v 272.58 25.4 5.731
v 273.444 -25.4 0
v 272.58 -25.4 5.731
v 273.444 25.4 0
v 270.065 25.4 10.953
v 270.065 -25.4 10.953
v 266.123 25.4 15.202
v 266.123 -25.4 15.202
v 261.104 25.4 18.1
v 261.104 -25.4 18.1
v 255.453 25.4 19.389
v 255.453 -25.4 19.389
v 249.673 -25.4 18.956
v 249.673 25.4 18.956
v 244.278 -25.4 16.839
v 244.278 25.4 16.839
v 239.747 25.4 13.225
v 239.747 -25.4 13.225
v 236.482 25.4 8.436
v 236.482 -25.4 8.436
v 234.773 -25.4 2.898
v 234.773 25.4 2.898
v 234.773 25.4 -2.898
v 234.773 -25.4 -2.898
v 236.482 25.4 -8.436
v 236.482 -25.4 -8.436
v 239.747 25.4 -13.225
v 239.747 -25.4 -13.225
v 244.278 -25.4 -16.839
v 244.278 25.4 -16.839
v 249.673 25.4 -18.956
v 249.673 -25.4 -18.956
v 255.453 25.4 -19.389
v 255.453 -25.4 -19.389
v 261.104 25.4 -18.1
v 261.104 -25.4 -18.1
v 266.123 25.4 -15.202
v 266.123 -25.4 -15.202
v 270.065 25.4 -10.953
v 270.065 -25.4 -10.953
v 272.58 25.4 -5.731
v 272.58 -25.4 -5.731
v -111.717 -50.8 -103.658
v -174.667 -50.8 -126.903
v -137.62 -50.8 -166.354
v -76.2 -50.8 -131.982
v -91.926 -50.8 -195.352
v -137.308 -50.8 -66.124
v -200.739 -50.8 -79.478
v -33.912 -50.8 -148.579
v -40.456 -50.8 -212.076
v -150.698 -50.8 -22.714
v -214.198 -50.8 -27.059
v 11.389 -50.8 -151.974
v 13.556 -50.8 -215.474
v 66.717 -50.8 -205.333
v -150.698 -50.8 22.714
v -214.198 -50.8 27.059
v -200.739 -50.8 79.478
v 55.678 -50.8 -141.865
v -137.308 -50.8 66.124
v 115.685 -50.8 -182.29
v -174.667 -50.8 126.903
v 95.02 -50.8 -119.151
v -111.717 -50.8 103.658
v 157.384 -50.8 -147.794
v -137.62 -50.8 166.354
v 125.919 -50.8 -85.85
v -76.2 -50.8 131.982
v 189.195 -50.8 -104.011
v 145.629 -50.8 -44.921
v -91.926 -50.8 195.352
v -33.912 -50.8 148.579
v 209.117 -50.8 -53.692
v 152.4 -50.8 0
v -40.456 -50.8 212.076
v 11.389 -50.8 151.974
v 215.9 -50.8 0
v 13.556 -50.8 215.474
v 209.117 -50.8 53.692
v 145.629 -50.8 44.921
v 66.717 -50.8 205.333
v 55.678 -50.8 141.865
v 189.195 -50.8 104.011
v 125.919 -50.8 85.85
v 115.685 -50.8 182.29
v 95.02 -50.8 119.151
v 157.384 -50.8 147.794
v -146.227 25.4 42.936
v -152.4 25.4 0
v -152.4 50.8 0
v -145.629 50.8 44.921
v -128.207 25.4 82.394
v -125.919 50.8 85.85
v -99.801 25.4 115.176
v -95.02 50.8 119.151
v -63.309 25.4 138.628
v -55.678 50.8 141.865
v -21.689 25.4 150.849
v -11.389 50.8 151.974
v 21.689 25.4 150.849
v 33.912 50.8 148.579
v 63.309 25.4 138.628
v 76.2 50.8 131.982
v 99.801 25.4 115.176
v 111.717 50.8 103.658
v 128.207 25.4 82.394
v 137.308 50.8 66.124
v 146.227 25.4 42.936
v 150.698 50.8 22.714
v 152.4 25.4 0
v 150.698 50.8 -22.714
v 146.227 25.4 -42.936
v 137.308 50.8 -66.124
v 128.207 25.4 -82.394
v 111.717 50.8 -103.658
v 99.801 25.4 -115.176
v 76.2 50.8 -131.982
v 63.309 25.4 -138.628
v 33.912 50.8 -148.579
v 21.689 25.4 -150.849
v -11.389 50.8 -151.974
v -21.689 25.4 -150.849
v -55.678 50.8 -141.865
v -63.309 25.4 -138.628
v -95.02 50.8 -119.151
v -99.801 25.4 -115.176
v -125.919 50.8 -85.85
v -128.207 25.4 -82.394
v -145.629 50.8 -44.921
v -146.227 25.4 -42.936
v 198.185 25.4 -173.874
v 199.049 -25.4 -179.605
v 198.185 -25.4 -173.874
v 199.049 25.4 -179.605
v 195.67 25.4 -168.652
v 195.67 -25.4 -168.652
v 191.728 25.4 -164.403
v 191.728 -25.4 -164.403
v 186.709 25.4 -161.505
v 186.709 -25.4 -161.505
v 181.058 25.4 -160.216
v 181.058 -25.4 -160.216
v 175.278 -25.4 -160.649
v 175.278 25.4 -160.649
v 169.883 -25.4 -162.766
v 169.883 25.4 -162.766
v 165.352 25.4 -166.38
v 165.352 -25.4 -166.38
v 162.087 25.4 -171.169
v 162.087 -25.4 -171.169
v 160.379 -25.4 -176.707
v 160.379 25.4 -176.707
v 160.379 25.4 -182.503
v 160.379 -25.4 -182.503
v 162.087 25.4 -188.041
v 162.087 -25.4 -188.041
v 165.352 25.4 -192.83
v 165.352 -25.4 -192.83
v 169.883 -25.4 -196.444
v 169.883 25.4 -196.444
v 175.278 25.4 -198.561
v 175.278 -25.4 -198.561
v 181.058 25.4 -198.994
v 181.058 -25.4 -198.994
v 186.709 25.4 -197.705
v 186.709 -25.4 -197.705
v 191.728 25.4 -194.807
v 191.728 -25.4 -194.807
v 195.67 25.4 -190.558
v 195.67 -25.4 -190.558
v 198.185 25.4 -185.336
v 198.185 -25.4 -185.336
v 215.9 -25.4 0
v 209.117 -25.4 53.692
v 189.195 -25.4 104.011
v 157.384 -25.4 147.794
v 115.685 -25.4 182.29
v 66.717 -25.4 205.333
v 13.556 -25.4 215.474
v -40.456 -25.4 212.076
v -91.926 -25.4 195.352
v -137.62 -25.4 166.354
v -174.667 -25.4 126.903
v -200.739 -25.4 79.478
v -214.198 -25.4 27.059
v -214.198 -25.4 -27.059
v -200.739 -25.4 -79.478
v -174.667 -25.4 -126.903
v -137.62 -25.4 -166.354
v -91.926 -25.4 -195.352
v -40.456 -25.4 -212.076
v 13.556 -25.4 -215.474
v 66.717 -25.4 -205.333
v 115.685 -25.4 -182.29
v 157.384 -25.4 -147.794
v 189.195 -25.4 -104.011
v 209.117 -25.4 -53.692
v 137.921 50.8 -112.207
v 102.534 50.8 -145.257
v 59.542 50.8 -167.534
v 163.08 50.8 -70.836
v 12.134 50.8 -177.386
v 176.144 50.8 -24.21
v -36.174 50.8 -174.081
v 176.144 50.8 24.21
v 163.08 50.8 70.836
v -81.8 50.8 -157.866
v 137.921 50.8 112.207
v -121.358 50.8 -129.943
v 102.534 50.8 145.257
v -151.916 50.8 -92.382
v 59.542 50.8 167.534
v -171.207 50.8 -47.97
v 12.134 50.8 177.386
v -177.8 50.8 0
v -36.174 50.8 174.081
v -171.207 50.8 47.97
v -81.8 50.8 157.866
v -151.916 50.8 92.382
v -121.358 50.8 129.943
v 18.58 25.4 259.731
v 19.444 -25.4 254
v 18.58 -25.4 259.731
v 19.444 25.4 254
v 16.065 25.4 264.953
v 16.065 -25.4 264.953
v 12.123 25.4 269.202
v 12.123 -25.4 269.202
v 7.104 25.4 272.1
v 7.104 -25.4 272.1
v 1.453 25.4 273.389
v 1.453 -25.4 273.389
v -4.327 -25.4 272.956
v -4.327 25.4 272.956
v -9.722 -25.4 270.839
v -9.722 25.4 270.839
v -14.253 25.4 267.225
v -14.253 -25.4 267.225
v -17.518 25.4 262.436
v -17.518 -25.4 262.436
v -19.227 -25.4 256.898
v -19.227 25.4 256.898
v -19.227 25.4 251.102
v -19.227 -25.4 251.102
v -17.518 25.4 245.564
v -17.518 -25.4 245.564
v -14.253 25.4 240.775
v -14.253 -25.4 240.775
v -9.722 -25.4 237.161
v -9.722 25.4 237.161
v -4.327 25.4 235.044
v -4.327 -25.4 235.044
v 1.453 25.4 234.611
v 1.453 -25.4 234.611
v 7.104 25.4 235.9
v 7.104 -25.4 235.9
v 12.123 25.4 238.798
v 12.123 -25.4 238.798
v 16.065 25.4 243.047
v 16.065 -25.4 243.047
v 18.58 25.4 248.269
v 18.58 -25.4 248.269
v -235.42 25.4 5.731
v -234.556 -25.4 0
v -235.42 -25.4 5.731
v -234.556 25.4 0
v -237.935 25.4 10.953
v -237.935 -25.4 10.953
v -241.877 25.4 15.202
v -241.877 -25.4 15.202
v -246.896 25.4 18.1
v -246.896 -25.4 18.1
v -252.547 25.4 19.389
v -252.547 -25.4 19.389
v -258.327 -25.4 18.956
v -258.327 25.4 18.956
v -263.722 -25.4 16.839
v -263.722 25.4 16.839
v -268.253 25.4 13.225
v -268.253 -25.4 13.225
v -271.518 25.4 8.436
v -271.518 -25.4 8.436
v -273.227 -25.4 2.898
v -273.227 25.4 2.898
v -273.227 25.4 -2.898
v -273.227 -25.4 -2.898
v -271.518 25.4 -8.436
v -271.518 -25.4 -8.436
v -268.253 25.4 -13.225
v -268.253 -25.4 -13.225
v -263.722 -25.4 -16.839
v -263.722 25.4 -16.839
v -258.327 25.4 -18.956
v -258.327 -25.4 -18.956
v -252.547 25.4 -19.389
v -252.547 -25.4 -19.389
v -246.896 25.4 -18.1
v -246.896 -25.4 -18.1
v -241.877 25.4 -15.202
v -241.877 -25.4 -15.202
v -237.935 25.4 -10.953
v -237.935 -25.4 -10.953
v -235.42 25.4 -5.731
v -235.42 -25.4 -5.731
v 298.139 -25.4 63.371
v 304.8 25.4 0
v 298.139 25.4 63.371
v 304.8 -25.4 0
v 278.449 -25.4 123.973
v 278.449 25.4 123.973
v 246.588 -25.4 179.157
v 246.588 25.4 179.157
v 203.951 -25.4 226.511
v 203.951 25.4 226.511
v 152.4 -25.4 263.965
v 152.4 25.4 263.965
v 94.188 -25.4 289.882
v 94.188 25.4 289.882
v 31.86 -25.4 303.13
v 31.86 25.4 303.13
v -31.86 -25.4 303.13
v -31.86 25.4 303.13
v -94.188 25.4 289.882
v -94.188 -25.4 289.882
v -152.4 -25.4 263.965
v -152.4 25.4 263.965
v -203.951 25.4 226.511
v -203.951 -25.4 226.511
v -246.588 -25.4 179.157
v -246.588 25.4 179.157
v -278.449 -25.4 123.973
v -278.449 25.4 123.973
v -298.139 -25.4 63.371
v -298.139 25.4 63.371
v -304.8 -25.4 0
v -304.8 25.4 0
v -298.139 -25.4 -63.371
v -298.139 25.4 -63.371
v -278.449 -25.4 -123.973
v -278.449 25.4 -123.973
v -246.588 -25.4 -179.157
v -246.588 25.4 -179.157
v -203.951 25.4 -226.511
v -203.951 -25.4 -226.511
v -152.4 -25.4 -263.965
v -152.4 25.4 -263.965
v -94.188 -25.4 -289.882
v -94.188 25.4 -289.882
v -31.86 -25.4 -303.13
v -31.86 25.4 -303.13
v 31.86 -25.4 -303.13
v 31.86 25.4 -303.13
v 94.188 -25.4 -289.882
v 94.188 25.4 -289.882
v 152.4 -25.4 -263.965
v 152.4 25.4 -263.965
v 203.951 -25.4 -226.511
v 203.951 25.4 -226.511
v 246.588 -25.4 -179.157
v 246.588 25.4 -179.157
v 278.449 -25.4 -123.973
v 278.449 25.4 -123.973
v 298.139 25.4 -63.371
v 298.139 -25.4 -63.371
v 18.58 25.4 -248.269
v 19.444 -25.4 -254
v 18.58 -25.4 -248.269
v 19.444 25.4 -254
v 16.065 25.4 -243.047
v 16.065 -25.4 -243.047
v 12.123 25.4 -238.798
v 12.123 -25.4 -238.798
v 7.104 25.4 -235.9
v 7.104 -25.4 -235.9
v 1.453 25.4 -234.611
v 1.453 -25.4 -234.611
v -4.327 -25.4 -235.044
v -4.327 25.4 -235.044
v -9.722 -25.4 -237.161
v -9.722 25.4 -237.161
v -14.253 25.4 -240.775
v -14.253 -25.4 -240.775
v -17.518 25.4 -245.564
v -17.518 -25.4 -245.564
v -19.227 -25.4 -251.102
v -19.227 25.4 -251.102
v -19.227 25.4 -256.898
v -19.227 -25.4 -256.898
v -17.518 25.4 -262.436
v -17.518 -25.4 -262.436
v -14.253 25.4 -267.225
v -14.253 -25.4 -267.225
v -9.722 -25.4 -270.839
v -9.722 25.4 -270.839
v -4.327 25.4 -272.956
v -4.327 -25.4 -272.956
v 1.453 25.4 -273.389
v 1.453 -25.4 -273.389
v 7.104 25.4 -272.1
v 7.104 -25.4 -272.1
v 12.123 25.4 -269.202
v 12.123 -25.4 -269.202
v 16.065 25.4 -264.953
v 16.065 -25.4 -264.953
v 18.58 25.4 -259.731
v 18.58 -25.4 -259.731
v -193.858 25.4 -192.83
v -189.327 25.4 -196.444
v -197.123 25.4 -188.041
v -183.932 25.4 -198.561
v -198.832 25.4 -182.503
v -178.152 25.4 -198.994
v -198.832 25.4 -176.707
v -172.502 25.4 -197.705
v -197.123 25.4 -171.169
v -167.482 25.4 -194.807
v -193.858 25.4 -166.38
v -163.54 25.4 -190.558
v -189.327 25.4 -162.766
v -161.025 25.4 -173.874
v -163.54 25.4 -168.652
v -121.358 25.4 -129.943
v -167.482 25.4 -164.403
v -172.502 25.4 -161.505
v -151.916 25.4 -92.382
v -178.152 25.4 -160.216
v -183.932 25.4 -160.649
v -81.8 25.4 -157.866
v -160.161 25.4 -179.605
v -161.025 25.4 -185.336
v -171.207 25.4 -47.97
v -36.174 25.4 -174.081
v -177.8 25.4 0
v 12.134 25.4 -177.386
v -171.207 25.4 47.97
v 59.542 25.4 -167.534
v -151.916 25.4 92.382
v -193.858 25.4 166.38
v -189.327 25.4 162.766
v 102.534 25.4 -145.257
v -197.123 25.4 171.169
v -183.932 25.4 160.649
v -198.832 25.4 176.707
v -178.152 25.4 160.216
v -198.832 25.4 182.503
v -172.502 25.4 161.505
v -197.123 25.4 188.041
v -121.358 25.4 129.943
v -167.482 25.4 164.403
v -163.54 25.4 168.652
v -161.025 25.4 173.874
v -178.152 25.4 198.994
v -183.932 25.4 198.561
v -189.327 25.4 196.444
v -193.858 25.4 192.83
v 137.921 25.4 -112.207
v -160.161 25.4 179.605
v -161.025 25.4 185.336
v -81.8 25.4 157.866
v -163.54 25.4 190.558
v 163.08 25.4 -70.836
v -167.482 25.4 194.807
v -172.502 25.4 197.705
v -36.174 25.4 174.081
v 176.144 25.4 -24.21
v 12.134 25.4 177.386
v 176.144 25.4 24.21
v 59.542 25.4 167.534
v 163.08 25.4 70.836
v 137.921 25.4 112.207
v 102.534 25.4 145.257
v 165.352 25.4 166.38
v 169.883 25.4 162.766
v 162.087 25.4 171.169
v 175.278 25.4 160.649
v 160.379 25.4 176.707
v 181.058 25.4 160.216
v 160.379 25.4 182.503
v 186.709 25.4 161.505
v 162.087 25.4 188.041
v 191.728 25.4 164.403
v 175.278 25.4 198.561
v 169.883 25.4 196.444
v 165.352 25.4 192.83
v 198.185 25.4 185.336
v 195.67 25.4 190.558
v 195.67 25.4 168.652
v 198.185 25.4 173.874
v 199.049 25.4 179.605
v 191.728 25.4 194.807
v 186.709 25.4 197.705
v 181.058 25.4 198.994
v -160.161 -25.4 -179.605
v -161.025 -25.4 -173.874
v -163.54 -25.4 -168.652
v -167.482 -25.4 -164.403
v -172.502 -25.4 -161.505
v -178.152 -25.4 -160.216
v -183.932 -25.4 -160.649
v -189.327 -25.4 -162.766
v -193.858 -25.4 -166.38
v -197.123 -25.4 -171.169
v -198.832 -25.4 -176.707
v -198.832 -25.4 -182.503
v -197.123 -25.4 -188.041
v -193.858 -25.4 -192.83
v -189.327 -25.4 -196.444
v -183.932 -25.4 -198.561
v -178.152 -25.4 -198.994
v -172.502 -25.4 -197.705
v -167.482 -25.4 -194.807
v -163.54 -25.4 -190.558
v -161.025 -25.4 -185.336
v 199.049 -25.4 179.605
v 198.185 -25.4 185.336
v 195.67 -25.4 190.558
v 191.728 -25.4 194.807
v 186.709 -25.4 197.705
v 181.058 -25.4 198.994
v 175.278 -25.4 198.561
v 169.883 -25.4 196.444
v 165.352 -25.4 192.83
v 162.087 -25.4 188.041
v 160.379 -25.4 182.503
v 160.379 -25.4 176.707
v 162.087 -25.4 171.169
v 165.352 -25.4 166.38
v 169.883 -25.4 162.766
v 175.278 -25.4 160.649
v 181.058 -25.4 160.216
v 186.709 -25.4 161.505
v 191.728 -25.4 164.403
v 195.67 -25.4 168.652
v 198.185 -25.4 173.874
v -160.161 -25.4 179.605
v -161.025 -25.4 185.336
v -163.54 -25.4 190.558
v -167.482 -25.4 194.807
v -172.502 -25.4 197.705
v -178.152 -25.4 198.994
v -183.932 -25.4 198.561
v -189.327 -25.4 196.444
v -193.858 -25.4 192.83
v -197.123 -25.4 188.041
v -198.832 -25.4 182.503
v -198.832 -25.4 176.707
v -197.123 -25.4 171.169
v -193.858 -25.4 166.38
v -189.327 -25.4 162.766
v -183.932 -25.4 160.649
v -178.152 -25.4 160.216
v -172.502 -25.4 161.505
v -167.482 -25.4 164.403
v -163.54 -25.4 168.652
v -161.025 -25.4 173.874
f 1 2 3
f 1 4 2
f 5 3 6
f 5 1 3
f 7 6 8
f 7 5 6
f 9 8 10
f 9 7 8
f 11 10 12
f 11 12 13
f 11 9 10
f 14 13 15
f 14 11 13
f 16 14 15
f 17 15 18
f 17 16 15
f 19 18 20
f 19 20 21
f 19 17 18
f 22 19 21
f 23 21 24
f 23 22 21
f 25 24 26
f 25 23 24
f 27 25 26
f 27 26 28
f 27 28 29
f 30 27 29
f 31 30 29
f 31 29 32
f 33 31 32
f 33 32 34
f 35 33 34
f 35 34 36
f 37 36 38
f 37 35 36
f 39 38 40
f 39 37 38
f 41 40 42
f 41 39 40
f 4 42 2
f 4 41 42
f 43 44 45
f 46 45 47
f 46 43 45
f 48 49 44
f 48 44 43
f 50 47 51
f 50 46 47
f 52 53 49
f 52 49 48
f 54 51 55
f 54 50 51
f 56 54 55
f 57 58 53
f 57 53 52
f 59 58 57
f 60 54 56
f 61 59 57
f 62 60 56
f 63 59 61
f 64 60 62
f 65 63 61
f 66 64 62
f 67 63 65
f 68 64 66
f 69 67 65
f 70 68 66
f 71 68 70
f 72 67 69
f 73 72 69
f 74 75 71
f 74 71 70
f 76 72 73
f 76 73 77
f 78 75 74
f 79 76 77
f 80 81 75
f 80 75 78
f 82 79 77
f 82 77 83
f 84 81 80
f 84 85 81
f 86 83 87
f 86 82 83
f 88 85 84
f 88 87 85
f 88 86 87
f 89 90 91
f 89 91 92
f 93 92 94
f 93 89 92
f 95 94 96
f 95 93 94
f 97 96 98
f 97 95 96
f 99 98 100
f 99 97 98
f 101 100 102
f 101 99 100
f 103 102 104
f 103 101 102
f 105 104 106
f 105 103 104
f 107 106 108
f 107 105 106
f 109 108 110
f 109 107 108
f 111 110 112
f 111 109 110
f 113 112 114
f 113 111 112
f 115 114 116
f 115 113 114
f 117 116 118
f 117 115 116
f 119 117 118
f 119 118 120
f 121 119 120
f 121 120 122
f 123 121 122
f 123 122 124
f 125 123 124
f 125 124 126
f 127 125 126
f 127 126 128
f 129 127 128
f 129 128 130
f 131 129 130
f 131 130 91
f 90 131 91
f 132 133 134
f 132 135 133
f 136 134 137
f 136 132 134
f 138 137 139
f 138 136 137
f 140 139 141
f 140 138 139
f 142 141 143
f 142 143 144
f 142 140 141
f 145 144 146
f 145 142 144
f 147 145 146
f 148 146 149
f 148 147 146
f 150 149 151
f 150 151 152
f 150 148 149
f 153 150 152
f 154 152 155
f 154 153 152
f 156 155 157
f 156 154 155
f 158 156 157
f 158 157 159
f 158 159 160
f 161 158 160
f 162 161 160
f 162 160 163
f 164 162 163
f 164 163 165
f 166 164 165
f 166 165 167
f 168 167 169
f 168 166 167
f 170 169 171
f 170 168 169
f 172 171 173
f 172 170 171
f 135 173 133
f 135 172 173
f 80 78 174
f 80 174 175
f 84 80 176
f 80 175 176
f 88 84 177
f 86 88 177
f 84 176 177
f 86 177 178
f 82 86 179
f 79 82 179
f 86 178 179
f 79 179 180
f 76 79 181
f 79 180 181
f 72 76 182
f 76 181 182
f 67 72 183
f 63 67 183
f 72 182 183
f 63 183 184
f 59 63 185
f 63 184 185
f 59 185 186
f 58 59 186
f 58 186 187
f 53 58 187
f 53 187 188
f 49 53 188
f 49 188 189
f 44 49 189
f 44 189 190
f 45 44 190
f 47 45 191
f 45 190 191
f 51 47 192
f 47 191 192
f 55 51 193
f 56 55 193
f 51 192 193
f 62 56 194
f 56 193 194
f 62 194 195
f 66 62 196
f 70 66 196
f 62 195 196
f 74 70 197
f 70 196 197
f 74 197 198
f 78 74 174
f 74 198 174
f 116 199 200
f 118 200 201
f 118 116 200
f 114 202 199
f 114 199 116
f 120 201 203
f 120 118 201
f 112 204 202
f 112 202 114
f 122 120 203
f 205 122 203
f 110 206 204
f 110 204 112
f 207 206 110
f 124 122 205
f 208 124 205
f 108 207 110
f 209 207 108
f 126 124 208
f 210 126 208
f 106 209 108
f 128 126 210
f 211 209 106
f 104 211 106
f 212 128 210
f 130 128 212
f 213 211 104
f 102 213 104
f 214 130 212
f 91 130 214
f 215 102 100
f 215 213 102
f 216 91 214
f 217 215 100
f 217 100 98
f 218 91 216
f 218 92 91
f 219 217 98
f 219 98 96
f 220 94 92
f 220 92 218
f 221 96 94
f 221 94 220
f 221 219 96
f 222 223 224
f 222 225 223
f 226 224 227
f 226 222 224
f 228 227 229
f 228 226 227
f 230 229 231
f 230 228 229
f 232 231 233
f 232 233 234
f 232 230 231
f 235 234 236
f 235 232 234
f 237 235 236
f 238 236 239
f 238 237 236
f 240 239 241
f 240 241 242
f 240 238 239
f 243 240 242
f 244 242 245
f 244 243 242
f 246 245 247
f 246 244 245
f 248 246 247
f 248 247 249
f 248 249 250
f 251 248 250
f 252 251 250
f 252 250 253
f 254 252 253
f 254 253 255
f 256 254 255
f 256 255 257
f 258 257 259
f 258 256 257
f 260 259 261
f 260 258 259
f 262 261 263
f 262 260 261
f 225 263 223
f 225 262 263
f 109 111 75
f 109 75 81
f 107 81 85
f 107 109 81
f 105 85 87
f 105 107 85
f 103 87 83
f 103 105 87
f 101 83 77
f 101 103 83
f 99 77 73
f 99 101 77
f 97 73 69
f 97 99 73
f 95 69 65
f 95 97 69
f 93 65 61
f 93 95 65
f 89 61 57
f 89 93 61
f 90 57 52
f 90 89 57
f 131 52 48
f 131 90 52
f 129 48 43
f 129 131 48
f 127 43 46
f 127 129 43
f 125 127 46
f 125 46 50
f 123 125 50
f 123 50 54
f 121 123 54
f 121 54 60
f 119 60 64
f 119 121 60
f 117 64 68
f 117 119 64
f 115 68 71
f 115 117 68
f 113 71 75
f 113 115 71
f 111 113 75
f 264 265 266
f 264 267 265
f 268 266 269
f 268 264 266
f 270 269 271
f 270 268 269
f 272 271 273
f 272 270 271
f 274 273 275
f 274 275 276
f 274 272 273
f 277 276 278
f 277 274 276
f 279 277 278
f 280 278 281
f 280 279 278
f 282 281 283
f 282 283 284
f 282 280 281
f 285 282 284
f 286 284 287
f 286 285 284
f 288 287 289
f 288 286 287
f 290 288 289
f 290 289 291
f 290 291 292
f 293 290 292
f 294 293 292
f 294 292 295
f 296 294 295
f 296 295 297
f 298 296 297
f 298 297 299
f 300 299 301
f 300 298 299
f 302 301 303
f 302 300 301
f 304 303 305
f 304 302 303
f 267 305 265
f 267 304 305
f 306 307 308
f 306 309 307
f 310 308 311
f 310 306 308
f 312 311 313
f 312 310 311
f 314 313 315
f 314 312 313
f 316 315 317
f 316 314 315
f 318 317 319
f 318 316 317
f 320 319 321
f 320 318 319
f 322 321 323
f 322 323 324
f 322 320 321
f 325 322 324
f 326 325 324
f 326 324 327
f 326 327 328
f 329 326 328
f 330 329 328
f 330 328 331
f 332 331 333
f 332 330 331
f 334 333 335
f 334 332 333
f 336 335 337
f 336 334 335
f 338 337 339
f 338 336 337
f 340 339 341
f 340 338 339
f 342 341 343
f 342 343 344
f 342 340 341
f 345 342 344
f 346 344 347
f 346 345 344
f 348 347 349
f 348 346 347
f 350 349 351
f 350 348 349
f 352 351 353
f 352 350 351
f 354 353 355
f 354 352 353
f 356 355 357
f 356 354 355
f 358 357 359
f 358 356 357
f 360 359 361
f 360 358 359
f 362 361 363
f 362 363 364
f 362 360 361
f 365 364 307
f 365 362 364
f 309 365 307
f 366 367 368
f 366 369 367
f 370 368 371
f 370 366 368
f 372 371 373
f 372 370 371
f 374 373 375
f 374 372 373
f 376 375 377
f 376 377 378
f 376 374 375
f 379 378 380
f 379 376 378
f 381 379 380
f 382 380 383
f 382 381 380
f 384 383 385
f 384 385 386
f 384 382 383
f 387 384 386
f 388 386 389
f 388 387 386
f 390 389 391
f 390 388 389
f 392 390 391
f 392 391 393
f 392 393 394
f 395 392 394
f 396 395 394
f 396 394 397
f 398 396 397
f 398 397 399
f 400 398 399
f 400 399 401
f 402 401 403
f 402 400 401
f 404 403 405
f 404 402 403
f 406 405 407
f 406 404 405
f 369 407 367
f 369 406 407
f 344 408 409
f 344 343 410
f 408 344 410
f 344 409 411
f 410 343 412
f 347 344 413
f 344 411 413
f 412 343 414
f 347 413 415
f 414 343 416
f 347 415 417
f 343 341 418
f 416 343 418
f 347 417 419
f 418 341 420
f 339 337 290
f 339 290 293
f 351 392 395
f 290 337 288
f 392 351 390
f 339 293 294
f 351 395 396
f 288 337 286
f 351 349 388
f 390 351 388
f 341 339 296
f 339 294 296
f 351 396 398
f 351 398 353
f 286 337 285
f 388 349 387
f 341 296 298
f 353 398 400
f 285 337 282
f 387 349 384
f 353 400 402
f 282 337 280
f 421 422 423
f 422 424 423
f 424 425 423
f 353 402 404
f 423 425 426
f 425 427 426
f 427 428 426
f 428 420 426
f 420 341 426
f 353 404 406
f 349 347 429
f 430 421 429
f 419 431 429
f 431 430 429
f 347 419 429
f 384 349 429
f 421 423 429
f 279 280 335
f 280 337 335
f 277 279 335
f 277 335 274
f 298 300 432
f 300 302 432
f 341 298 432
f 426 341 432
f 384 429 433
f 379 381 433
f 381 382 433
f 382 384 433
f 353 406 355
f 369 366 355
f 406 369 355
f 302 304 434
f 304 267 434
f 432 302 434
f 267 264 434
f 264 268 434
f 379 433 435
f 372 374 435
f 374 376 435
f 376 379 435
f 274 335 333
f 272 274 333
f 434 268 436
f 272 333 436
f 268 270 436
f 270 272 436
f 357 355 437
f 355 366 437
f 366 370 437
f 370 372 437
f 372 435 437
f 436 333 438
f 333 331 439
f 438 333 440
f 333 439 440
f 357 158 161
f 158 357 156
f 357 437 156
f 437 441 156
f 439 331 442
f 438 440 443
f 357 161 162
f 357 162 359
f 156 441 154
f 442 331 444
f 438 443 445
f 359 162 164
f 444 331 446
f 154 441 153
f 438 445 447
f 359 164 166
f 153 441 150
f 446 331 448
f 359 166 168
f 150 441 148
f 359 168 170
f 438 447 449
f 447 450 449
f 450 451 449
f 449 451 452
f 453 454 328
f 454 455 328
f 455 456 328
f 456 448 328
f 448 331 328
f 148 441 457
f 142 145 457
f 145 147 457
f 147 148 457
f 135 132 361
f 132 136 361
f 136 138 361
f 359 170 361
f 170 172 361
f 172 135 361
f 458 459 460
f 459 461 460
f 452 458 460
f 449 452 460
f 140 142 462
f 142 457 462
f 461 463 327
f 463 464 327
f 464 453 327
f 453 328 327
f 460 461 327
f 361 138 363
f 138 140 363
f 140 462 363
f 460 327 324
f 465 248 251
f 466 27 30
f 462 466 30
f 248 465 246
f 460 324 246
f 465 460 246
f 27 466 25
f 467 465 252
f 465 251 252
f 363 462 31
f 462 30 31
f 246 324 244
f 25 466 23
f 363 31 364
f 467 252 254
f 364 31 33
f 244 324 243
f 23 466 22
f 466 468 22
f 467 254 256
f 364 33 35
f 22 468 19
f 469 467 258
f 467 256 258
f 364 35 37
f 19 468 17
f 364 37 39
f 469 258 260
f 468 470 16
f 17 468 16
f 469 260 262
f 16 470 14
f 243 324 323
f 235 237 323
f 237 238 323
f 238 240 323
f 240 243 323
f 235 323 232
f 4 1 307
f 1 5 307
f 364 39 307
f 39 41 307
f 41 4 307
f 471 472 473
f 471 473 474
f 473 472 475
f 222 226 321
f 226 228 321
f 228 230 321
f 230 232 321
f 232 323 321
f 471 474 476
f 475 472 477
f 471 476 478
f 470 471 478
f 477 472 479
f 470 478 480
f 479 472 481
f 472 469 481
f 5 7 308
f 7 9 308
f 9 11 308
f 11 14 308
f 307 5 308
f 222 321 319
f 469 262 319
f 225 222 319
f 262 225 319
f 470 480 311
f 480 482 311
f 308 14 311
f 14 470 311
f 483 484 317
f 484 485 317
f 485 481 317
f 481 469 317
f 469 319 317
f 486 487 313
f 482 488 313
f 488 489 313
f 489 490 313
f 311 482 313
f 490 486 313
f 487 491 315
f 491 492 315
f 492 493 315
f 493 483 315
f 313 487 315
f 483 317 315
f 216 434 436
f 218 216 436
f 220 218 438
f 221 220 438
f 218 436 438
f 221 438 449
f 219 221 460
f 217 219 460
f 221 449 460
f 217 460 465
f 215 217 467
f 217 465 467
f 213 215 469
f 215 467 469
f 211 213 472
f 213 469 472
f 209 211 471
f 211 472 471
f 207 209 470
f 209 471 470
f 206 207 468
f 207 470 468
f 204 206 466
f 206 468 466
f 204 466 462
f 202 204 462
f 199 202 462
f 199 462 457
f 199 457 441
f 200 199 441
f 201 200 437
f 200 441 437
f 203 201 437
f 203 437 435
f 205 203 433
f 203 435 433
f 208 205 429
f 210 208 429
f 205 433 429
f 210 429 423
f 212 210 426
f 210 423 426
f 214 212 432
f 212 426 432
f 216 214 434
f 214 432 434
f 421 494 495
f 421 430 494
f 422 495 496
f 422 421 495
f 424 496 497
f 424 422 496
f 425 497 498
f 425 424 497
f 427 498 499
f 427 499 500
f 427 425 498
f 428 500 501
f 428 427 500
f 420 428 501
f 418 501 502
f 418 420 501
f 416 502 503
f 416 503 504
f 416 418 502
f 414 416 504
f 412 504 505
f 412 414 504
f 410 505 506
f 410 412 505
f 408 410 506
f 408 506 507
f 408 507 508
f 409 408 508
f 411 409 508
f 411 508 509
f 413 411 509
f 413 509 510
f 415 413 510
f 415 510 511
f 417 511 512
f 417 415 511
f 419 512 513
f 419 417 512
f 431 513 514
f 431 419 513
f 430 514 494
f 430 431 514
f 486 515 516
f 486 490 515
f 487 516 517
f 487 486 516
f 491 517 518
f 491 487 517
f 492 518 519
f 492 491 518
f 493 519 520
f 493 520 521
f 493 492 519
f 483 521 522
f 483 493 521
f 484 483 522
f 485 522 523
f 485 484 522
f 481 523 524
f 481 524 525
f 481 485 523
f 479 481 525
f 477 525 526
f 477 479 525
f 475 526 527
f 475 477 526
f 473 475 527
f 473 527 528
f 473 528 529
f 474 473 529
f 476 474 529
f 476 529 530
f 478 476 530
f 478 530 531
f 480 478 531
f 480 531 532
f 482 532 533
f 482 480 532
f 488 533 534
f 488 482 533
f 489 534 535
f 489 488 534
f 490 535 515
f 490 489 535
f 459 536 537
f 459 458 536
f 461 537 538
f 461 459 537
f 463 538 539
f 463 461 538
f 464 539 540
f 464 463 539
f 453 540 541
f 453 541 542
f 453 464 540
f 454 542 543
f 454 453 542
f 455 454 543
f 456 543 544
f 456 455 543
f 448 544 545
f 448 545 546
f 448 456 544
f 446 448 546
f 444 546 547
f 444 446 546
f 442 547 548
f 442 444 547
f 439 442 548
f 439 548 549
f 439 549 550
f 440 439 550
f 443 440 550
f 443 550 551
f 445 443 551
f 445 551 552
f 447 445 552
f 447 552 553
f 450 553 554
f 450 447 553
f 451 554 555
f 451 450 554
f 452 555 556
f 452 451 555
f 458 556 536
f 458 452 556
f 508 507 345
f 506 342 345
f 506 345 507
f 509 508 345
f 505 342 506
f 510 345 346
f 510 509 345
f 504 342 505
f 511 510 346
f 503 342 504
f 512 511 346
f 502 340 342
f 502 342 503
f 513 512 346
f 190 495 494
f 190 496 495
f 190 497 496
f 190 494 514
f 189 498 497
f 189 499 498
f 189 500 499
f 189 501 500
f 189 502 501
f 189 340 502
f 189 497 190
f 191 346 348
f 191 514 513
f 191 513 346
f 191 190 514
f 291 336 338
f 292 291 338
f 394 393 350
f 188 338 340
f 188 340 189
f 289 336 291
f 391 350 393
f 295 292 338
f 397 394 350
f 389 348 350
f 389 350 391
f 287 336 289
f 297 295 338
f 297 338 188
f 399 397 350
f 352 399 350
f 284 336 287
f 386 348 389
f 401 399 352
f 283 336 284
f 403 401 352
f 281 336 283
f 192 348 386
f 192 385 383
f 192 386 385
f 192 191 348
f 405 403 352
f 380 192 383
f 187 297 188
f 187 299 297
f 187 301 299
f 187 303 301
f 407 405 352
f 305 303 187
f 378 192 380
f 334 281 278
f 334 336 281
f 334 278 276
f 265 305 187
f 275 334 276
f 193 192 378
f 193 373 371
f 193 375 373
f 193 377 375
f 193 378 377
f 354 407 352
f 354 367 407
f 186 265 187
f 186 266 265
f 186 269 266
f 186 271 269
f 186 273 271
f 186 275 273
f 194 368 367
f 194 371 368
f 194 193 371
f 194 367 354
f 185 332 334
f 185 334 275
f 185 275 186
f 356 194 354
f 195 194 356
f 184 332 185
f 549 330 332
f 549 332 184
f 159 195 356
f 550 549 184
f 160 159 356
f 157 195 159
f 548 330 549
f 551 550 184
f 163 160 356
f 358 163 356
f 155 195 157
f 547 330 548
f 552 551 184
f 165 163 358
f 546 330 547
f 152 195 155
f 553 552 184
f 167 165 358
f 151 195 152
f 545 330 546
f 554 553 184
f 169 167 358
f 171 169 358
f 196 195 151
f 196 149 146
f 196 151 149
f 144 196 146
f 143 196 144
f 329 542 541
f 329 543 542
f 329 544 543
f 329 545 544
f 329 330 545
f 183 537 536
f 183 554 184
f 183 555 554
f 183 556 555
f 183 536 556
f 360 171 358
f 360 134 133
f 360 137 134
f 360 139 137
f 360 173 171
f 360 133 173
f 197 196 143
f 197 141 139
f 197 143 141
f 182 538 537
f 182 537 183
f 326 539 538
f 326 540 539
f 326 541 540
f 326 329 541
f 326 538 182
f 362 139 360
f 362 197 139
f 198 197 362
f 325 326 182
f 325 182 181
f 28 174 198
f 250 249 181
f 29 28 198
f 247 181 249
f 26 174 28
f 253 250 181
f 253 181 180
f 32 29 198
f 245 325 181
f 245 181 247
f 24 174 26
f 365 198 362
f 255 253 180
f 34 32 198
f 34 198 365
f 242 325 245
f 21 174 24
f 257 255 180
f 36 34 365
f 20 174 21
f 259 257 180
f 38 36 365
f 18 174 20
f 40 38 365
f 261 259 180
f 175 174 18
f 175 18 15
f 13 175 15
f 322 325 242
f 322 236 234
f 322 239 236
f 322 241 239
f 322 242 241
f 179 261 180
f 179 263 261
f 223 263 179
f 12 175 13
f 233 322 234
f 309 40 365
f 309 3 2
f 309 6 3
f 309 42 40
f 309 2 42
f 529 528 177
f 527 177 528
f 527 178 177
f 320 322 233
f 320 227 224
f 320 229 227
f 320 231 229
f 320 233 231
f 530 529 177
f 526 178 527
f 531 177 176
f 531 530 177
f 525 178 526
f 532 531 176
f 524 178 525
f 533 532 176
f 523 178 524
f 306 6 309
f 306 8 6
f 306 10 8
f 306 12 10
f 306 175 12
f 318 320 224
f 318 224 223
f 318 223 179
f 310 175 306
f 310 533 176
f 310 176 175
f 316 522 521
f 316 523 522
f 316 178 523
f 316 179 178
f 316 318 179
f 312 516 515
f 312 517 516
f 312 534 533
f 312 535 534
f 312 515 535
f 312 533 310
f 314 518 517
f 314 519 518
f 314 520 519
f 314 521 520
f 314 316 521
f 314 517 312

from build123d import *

# Parameters (mm, degrees)
F0_R     = 304.8
F0_R_2   = 19.4437
F0_R_3   = 152.4
F1_DEPTH = 25.4
F2_R     = 215.9
F2_R_2   = 152.4
F3_DEPTH = 25.4
F4_R     = 177.8
F4_R_2   = 152.4
F5_DEPTH = 25.4


with BuildPart() as f1:
    # F0 (on Front) → F1 (new body, symmetric)
    with BuildSketch(Plane.XZ):
        Circle(F0_R)
        with Locations((-179.605122, -179.605122)):
            Circle(F0_R_2, mode=Mode.SUBTRACT)
        with Locations((0, -254)):
            Circle(F0_R_2, mode=Mode.SUBTRACT)
        with Locations((179.605122, -179.605122)):
            Circle(F0_R_2, mode=Mode.SUBTRACT)
        with Locations((-254, 0)):
            Circle(F0_R_2, mode=Mode.SUBTRACT)
        with Locations((-179.605122, 179.605122)):
            Circle(F0_R_2, mode=Mode.SUBTRACT)
        Circle(F0_R_3, mode=Mode.SUBTRACT)
        with Locations((254, 0)):
            Circle(F0_R_2, mode=Mode.SUBTRACT)
        with Locations((0, 254)):
            Circle(F0_R_2, mode=Mode.SUBTRACT)
        with Locations((179.605122, 179.605122)):
            Circle(F0_R_2, mode=Mode.SUBTRACT)
    extrude(amount=F1_DEPTH, both=True)

    # F2 (on face) → F3 (join)
    with BuildSketch(Plane.XZ.offset(25.4)):
        Circle(F2_R)
        Circle(F2_R_2, mode=Mode.SUBTRACT)
    extrude(amount=F3_DEPTH)

    # F4 (on face) → F5 (join)
    with BuildSketch(Plane(origin=(0, 25.4, 0), x_dir=(-1, 0, 0), z_dir=(0, 1, 0))):
        Circle(F4_R)
        Circle(F4_R_2, mode=Mode.SUBTRACT)
    extrude(amount=F5_DEPTH)


solid = f1.part
